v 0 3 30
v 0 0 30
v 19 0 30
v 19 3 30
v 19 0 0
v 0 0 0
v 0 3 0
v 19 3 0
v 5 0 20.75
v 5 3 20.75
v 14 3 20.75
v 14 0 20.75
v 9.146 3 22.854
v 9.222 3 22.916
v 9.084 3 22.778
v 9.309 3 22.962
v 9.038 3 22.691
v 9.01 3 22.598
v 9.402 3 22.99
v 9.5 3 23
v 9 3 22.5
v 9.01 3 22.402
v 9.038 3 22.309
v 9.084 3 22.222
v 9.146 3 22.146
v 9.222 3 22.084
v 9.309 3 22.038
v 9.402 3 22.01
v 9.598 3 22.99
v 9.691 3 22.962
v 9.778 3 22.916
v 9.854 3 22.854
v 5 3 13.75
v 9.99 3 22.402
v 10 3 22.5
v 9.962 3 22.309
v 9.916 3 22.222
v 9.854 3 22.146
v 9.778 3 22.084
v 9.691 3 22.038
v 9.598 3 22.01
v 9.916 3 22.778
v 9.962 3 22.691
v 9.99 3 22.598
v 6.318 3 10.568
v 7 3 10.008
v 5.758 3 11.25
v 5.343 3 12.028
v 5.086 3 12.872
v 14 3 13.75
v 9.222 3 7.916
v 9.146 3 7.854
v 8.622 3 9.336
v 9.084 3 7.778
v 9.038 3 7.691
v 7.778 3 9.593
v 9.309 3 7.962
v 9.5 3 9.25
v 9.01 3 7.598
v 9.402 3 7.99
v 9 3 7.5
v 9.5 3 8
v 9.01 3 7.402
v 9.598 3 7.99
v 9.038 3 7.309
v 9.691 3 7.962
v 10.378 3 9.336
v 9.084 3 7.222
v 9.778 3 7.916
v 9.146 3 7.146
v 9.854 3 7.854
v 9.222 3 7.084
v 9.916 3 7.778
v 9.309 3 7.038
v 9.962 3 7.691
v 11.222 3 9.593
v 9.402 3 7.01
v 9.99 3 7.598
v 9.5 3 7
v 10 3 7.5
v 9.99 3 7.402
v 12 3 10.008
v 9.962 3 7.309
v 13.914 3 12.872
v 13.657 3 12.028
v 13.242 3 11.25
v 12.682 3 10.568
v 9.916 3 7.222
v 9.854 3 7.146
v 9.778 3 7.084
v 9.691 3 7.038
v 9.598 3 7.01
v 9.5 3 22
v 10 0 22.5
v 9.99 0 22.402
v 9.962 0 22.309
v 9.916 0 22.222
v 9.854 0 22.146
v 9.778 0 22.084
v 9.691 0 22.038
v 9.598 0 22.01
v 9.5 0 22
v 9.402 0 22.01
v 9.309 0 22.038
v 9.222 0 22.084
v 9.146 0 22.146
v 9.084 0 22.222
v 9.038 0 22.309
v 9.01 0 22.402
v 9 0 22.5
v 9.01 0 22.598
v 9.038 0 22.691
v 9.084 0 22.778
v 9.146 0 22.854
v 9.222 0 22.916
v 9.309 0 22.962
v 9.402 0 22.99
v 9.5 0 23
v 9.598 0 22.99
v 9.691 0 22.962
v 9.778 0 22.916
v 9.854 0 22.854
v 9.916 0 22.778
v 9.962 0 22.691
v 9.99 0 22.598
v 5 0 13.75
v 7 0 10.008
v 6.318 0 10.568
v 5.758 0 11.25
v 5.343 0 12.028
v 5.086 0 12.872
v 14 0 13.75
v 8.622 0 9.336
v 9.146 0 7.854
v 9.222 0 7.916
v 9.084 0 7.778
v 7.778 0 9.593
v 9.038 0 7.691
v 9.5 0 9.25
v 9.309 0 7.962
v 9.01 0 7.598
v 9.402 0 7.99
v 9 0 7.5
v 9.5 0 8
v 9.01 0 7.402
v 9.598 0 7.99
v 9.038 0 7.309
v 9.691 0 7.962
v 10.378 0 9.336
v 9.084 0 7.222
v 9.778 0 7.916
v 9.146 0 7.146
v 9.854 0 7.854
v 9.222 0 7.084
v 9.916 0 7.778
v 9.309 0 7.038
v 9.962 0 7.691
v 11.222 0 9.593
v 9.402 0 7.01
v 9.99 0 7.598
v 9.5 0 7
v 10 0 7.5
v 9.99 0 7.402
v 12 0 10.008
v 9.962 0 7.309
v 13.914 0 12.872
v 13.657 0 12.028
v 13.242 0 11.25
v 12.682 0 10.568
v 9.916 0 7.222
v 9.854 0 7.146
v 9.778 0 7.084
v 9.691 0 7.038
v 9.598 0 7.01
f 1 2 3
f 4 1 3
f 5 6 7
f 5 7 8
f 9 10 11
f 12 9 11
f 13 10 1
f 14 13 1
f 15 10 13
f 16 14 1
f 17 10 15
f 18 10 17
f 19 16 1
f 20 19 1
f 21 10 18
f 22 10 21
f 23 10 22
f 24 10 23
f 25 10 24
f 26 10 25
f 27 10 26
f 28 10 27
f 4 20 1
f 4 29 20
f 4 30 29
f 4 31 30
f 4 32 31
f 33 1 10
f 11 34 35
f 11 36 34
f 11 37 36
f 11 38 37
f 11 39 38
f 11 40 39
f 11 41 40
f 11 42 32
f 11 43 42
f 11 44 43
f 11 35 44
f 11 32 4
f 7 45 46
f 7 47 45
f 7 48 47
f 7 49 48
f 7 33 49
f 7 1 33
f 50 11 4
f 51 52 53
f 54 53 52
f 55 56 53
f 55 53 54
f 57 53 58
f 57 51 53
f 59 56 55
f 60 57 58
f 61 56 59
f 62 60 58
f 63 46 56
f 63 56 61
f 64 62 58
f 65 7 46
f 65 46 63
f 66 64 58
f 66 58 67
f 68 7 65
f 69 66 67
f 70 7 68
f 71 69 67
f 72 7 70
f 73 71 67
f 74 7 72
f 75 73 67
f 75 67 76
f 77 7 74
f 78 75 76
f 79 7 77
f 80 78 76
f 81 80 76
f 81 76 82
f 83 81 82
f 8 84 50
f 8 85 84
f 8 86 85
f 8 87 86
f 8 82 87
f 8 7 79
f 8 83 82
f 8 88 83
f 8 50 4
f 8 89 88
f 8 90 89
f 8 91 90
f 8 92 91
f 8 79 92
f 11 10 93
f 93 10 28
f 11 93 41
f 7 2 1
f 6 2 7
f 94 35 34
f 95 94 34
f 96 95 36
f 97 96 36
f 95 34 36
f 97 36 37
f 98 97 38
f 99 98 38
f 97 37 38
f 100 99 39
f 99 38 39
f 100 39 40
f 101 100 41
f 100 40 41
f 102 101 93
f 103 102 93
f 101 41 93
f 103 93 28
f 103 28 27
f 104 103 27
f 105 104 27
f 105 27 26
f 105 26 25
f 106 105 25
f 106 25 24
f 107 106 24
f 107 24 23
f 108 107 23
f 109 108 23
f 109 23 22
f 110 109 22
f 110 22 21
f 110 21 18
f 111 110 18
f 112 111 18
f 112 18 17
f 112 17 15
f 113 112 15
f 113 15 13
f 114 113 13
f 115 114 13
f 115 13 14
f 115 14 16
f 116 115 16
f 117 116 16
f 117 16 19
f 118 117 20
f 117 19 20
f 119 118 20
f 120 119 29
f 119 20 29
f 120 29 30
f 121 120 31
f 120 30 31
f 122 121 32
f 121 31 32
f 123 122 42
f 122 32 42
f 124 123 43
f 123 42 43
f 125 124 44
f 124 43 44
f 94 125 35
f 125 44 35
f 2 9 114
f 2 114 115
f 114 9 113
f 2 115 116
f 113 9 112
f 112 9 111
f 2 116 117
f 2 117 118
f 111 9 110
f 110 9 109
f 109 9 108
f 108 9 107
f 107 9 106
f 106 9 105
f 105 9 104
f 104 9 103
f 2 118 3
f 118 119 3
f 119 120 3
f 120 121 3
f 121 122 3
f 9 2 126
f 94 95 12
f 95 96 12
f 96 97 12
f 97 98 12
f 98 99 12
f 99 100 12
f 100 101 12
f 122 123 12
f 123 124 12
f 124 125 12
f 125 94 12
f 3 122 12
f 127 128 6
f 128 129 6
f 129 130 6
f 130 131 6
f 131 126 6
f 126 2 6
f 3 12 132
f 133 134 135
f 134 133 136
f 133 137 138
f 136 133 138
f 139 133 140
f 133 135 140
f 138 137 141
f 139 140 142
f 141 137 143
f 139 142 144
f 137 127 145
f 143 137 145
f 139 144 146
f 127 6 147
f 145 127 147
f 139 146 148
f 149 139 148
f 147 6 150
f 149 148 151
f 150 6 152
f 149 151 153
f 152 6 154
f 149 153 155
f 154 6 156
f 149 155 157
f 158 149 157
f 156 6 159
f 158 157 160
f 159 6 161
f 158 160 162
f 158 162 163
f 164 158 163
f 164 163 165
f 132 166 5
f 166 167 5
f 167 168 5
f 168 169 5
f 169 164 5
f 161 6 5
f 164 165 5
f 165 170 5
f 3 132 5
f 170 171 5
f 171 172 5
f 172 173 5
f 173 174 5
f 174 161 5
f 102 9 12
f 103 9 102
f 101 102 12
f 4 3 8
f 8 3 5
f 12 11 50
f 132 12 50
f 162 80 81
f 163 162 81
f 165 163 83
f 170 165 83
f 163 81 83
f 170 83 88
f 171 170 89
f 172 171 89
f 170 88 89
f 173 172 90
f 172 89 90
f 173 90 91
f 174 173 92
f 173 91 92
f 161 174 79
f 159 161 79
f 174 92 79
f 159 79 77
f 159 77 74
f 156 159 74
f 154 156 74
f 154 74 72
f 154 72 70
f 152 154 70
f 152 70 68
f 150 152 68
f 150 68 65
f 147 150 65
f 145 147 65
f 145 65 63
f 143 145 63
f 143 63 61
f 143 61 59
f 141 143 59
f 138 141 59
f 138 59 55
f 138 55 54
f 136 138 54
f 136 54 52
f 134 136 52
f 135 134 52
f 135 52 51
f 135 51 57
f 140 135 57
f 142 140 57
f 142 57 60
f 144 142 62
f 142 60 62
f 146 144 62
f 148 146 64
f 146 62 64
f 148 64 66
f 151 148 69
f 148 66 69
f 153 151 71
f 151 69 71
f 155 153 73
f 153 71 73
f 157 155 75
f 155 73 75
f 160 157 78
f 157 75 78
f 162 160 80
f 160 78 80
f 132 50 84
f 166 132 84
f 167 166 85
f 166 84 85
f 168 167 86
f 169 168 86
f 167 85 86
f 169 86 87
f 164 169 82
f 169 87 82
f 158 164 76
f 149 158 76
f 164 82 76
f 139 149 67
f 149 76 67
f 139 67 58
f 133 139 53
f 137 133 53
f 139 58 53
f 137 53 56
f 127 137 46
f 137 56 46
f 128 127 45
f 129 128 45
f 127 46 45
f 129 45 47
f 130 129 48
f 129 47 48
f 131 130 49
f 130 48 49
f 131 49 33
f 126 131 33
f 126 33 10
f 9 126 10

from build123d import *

# Parameters (mm, degrees)
SKETCH1_W           = 19
SKETCH1_H           = 30
BOSS_EXTRUDE1_DEPTH = 3
SKETCH2_R           = 0.5
CUT_EXTRUDE1_DEPTH  = 4


with BuildPart() as part:
    # Sketch1 → Boss-Extrude1 (new body)
    with BuildSketch(Plane(origin=(0, 0, 0), x_dir=(1, 0, 0), z_dir=(0, 1, 0))):
        with Locations((9.5, -15)):
            Rectangle(SKETCH1_W, SKETCH1_H)
    extrude(amount=BOSS_EXTRUDE1_DEPTH)

    # Sketch2 → Cut-Extrude1 (cut, through all)
    with BuildSketch(Plane(origin=(0, 3, 0), x_dir=(1, 0, 0), z_dir=(0, 1, 0))):
        with BuildLine():
            Line((5, -20.75), (14, -20.75))
            Line((14, -20.75), (14, -13.75))
            ThreePointArc((14, -13.75), (9.5, -9.25), (5, -13.75))
            Line((5, -13.75), (5, -20.75))
        make_face()
        with Locations((9.5, -22.5)):
            Circle(SKETCH2_R)
        with Locations((9.5, -7.5)):
            Circle(SKETCH2_R)
    extrude(amount=-CUT_EXTRUDE1_DEPTH, mode=Mode.SUBTRACT)


solid = part.part
